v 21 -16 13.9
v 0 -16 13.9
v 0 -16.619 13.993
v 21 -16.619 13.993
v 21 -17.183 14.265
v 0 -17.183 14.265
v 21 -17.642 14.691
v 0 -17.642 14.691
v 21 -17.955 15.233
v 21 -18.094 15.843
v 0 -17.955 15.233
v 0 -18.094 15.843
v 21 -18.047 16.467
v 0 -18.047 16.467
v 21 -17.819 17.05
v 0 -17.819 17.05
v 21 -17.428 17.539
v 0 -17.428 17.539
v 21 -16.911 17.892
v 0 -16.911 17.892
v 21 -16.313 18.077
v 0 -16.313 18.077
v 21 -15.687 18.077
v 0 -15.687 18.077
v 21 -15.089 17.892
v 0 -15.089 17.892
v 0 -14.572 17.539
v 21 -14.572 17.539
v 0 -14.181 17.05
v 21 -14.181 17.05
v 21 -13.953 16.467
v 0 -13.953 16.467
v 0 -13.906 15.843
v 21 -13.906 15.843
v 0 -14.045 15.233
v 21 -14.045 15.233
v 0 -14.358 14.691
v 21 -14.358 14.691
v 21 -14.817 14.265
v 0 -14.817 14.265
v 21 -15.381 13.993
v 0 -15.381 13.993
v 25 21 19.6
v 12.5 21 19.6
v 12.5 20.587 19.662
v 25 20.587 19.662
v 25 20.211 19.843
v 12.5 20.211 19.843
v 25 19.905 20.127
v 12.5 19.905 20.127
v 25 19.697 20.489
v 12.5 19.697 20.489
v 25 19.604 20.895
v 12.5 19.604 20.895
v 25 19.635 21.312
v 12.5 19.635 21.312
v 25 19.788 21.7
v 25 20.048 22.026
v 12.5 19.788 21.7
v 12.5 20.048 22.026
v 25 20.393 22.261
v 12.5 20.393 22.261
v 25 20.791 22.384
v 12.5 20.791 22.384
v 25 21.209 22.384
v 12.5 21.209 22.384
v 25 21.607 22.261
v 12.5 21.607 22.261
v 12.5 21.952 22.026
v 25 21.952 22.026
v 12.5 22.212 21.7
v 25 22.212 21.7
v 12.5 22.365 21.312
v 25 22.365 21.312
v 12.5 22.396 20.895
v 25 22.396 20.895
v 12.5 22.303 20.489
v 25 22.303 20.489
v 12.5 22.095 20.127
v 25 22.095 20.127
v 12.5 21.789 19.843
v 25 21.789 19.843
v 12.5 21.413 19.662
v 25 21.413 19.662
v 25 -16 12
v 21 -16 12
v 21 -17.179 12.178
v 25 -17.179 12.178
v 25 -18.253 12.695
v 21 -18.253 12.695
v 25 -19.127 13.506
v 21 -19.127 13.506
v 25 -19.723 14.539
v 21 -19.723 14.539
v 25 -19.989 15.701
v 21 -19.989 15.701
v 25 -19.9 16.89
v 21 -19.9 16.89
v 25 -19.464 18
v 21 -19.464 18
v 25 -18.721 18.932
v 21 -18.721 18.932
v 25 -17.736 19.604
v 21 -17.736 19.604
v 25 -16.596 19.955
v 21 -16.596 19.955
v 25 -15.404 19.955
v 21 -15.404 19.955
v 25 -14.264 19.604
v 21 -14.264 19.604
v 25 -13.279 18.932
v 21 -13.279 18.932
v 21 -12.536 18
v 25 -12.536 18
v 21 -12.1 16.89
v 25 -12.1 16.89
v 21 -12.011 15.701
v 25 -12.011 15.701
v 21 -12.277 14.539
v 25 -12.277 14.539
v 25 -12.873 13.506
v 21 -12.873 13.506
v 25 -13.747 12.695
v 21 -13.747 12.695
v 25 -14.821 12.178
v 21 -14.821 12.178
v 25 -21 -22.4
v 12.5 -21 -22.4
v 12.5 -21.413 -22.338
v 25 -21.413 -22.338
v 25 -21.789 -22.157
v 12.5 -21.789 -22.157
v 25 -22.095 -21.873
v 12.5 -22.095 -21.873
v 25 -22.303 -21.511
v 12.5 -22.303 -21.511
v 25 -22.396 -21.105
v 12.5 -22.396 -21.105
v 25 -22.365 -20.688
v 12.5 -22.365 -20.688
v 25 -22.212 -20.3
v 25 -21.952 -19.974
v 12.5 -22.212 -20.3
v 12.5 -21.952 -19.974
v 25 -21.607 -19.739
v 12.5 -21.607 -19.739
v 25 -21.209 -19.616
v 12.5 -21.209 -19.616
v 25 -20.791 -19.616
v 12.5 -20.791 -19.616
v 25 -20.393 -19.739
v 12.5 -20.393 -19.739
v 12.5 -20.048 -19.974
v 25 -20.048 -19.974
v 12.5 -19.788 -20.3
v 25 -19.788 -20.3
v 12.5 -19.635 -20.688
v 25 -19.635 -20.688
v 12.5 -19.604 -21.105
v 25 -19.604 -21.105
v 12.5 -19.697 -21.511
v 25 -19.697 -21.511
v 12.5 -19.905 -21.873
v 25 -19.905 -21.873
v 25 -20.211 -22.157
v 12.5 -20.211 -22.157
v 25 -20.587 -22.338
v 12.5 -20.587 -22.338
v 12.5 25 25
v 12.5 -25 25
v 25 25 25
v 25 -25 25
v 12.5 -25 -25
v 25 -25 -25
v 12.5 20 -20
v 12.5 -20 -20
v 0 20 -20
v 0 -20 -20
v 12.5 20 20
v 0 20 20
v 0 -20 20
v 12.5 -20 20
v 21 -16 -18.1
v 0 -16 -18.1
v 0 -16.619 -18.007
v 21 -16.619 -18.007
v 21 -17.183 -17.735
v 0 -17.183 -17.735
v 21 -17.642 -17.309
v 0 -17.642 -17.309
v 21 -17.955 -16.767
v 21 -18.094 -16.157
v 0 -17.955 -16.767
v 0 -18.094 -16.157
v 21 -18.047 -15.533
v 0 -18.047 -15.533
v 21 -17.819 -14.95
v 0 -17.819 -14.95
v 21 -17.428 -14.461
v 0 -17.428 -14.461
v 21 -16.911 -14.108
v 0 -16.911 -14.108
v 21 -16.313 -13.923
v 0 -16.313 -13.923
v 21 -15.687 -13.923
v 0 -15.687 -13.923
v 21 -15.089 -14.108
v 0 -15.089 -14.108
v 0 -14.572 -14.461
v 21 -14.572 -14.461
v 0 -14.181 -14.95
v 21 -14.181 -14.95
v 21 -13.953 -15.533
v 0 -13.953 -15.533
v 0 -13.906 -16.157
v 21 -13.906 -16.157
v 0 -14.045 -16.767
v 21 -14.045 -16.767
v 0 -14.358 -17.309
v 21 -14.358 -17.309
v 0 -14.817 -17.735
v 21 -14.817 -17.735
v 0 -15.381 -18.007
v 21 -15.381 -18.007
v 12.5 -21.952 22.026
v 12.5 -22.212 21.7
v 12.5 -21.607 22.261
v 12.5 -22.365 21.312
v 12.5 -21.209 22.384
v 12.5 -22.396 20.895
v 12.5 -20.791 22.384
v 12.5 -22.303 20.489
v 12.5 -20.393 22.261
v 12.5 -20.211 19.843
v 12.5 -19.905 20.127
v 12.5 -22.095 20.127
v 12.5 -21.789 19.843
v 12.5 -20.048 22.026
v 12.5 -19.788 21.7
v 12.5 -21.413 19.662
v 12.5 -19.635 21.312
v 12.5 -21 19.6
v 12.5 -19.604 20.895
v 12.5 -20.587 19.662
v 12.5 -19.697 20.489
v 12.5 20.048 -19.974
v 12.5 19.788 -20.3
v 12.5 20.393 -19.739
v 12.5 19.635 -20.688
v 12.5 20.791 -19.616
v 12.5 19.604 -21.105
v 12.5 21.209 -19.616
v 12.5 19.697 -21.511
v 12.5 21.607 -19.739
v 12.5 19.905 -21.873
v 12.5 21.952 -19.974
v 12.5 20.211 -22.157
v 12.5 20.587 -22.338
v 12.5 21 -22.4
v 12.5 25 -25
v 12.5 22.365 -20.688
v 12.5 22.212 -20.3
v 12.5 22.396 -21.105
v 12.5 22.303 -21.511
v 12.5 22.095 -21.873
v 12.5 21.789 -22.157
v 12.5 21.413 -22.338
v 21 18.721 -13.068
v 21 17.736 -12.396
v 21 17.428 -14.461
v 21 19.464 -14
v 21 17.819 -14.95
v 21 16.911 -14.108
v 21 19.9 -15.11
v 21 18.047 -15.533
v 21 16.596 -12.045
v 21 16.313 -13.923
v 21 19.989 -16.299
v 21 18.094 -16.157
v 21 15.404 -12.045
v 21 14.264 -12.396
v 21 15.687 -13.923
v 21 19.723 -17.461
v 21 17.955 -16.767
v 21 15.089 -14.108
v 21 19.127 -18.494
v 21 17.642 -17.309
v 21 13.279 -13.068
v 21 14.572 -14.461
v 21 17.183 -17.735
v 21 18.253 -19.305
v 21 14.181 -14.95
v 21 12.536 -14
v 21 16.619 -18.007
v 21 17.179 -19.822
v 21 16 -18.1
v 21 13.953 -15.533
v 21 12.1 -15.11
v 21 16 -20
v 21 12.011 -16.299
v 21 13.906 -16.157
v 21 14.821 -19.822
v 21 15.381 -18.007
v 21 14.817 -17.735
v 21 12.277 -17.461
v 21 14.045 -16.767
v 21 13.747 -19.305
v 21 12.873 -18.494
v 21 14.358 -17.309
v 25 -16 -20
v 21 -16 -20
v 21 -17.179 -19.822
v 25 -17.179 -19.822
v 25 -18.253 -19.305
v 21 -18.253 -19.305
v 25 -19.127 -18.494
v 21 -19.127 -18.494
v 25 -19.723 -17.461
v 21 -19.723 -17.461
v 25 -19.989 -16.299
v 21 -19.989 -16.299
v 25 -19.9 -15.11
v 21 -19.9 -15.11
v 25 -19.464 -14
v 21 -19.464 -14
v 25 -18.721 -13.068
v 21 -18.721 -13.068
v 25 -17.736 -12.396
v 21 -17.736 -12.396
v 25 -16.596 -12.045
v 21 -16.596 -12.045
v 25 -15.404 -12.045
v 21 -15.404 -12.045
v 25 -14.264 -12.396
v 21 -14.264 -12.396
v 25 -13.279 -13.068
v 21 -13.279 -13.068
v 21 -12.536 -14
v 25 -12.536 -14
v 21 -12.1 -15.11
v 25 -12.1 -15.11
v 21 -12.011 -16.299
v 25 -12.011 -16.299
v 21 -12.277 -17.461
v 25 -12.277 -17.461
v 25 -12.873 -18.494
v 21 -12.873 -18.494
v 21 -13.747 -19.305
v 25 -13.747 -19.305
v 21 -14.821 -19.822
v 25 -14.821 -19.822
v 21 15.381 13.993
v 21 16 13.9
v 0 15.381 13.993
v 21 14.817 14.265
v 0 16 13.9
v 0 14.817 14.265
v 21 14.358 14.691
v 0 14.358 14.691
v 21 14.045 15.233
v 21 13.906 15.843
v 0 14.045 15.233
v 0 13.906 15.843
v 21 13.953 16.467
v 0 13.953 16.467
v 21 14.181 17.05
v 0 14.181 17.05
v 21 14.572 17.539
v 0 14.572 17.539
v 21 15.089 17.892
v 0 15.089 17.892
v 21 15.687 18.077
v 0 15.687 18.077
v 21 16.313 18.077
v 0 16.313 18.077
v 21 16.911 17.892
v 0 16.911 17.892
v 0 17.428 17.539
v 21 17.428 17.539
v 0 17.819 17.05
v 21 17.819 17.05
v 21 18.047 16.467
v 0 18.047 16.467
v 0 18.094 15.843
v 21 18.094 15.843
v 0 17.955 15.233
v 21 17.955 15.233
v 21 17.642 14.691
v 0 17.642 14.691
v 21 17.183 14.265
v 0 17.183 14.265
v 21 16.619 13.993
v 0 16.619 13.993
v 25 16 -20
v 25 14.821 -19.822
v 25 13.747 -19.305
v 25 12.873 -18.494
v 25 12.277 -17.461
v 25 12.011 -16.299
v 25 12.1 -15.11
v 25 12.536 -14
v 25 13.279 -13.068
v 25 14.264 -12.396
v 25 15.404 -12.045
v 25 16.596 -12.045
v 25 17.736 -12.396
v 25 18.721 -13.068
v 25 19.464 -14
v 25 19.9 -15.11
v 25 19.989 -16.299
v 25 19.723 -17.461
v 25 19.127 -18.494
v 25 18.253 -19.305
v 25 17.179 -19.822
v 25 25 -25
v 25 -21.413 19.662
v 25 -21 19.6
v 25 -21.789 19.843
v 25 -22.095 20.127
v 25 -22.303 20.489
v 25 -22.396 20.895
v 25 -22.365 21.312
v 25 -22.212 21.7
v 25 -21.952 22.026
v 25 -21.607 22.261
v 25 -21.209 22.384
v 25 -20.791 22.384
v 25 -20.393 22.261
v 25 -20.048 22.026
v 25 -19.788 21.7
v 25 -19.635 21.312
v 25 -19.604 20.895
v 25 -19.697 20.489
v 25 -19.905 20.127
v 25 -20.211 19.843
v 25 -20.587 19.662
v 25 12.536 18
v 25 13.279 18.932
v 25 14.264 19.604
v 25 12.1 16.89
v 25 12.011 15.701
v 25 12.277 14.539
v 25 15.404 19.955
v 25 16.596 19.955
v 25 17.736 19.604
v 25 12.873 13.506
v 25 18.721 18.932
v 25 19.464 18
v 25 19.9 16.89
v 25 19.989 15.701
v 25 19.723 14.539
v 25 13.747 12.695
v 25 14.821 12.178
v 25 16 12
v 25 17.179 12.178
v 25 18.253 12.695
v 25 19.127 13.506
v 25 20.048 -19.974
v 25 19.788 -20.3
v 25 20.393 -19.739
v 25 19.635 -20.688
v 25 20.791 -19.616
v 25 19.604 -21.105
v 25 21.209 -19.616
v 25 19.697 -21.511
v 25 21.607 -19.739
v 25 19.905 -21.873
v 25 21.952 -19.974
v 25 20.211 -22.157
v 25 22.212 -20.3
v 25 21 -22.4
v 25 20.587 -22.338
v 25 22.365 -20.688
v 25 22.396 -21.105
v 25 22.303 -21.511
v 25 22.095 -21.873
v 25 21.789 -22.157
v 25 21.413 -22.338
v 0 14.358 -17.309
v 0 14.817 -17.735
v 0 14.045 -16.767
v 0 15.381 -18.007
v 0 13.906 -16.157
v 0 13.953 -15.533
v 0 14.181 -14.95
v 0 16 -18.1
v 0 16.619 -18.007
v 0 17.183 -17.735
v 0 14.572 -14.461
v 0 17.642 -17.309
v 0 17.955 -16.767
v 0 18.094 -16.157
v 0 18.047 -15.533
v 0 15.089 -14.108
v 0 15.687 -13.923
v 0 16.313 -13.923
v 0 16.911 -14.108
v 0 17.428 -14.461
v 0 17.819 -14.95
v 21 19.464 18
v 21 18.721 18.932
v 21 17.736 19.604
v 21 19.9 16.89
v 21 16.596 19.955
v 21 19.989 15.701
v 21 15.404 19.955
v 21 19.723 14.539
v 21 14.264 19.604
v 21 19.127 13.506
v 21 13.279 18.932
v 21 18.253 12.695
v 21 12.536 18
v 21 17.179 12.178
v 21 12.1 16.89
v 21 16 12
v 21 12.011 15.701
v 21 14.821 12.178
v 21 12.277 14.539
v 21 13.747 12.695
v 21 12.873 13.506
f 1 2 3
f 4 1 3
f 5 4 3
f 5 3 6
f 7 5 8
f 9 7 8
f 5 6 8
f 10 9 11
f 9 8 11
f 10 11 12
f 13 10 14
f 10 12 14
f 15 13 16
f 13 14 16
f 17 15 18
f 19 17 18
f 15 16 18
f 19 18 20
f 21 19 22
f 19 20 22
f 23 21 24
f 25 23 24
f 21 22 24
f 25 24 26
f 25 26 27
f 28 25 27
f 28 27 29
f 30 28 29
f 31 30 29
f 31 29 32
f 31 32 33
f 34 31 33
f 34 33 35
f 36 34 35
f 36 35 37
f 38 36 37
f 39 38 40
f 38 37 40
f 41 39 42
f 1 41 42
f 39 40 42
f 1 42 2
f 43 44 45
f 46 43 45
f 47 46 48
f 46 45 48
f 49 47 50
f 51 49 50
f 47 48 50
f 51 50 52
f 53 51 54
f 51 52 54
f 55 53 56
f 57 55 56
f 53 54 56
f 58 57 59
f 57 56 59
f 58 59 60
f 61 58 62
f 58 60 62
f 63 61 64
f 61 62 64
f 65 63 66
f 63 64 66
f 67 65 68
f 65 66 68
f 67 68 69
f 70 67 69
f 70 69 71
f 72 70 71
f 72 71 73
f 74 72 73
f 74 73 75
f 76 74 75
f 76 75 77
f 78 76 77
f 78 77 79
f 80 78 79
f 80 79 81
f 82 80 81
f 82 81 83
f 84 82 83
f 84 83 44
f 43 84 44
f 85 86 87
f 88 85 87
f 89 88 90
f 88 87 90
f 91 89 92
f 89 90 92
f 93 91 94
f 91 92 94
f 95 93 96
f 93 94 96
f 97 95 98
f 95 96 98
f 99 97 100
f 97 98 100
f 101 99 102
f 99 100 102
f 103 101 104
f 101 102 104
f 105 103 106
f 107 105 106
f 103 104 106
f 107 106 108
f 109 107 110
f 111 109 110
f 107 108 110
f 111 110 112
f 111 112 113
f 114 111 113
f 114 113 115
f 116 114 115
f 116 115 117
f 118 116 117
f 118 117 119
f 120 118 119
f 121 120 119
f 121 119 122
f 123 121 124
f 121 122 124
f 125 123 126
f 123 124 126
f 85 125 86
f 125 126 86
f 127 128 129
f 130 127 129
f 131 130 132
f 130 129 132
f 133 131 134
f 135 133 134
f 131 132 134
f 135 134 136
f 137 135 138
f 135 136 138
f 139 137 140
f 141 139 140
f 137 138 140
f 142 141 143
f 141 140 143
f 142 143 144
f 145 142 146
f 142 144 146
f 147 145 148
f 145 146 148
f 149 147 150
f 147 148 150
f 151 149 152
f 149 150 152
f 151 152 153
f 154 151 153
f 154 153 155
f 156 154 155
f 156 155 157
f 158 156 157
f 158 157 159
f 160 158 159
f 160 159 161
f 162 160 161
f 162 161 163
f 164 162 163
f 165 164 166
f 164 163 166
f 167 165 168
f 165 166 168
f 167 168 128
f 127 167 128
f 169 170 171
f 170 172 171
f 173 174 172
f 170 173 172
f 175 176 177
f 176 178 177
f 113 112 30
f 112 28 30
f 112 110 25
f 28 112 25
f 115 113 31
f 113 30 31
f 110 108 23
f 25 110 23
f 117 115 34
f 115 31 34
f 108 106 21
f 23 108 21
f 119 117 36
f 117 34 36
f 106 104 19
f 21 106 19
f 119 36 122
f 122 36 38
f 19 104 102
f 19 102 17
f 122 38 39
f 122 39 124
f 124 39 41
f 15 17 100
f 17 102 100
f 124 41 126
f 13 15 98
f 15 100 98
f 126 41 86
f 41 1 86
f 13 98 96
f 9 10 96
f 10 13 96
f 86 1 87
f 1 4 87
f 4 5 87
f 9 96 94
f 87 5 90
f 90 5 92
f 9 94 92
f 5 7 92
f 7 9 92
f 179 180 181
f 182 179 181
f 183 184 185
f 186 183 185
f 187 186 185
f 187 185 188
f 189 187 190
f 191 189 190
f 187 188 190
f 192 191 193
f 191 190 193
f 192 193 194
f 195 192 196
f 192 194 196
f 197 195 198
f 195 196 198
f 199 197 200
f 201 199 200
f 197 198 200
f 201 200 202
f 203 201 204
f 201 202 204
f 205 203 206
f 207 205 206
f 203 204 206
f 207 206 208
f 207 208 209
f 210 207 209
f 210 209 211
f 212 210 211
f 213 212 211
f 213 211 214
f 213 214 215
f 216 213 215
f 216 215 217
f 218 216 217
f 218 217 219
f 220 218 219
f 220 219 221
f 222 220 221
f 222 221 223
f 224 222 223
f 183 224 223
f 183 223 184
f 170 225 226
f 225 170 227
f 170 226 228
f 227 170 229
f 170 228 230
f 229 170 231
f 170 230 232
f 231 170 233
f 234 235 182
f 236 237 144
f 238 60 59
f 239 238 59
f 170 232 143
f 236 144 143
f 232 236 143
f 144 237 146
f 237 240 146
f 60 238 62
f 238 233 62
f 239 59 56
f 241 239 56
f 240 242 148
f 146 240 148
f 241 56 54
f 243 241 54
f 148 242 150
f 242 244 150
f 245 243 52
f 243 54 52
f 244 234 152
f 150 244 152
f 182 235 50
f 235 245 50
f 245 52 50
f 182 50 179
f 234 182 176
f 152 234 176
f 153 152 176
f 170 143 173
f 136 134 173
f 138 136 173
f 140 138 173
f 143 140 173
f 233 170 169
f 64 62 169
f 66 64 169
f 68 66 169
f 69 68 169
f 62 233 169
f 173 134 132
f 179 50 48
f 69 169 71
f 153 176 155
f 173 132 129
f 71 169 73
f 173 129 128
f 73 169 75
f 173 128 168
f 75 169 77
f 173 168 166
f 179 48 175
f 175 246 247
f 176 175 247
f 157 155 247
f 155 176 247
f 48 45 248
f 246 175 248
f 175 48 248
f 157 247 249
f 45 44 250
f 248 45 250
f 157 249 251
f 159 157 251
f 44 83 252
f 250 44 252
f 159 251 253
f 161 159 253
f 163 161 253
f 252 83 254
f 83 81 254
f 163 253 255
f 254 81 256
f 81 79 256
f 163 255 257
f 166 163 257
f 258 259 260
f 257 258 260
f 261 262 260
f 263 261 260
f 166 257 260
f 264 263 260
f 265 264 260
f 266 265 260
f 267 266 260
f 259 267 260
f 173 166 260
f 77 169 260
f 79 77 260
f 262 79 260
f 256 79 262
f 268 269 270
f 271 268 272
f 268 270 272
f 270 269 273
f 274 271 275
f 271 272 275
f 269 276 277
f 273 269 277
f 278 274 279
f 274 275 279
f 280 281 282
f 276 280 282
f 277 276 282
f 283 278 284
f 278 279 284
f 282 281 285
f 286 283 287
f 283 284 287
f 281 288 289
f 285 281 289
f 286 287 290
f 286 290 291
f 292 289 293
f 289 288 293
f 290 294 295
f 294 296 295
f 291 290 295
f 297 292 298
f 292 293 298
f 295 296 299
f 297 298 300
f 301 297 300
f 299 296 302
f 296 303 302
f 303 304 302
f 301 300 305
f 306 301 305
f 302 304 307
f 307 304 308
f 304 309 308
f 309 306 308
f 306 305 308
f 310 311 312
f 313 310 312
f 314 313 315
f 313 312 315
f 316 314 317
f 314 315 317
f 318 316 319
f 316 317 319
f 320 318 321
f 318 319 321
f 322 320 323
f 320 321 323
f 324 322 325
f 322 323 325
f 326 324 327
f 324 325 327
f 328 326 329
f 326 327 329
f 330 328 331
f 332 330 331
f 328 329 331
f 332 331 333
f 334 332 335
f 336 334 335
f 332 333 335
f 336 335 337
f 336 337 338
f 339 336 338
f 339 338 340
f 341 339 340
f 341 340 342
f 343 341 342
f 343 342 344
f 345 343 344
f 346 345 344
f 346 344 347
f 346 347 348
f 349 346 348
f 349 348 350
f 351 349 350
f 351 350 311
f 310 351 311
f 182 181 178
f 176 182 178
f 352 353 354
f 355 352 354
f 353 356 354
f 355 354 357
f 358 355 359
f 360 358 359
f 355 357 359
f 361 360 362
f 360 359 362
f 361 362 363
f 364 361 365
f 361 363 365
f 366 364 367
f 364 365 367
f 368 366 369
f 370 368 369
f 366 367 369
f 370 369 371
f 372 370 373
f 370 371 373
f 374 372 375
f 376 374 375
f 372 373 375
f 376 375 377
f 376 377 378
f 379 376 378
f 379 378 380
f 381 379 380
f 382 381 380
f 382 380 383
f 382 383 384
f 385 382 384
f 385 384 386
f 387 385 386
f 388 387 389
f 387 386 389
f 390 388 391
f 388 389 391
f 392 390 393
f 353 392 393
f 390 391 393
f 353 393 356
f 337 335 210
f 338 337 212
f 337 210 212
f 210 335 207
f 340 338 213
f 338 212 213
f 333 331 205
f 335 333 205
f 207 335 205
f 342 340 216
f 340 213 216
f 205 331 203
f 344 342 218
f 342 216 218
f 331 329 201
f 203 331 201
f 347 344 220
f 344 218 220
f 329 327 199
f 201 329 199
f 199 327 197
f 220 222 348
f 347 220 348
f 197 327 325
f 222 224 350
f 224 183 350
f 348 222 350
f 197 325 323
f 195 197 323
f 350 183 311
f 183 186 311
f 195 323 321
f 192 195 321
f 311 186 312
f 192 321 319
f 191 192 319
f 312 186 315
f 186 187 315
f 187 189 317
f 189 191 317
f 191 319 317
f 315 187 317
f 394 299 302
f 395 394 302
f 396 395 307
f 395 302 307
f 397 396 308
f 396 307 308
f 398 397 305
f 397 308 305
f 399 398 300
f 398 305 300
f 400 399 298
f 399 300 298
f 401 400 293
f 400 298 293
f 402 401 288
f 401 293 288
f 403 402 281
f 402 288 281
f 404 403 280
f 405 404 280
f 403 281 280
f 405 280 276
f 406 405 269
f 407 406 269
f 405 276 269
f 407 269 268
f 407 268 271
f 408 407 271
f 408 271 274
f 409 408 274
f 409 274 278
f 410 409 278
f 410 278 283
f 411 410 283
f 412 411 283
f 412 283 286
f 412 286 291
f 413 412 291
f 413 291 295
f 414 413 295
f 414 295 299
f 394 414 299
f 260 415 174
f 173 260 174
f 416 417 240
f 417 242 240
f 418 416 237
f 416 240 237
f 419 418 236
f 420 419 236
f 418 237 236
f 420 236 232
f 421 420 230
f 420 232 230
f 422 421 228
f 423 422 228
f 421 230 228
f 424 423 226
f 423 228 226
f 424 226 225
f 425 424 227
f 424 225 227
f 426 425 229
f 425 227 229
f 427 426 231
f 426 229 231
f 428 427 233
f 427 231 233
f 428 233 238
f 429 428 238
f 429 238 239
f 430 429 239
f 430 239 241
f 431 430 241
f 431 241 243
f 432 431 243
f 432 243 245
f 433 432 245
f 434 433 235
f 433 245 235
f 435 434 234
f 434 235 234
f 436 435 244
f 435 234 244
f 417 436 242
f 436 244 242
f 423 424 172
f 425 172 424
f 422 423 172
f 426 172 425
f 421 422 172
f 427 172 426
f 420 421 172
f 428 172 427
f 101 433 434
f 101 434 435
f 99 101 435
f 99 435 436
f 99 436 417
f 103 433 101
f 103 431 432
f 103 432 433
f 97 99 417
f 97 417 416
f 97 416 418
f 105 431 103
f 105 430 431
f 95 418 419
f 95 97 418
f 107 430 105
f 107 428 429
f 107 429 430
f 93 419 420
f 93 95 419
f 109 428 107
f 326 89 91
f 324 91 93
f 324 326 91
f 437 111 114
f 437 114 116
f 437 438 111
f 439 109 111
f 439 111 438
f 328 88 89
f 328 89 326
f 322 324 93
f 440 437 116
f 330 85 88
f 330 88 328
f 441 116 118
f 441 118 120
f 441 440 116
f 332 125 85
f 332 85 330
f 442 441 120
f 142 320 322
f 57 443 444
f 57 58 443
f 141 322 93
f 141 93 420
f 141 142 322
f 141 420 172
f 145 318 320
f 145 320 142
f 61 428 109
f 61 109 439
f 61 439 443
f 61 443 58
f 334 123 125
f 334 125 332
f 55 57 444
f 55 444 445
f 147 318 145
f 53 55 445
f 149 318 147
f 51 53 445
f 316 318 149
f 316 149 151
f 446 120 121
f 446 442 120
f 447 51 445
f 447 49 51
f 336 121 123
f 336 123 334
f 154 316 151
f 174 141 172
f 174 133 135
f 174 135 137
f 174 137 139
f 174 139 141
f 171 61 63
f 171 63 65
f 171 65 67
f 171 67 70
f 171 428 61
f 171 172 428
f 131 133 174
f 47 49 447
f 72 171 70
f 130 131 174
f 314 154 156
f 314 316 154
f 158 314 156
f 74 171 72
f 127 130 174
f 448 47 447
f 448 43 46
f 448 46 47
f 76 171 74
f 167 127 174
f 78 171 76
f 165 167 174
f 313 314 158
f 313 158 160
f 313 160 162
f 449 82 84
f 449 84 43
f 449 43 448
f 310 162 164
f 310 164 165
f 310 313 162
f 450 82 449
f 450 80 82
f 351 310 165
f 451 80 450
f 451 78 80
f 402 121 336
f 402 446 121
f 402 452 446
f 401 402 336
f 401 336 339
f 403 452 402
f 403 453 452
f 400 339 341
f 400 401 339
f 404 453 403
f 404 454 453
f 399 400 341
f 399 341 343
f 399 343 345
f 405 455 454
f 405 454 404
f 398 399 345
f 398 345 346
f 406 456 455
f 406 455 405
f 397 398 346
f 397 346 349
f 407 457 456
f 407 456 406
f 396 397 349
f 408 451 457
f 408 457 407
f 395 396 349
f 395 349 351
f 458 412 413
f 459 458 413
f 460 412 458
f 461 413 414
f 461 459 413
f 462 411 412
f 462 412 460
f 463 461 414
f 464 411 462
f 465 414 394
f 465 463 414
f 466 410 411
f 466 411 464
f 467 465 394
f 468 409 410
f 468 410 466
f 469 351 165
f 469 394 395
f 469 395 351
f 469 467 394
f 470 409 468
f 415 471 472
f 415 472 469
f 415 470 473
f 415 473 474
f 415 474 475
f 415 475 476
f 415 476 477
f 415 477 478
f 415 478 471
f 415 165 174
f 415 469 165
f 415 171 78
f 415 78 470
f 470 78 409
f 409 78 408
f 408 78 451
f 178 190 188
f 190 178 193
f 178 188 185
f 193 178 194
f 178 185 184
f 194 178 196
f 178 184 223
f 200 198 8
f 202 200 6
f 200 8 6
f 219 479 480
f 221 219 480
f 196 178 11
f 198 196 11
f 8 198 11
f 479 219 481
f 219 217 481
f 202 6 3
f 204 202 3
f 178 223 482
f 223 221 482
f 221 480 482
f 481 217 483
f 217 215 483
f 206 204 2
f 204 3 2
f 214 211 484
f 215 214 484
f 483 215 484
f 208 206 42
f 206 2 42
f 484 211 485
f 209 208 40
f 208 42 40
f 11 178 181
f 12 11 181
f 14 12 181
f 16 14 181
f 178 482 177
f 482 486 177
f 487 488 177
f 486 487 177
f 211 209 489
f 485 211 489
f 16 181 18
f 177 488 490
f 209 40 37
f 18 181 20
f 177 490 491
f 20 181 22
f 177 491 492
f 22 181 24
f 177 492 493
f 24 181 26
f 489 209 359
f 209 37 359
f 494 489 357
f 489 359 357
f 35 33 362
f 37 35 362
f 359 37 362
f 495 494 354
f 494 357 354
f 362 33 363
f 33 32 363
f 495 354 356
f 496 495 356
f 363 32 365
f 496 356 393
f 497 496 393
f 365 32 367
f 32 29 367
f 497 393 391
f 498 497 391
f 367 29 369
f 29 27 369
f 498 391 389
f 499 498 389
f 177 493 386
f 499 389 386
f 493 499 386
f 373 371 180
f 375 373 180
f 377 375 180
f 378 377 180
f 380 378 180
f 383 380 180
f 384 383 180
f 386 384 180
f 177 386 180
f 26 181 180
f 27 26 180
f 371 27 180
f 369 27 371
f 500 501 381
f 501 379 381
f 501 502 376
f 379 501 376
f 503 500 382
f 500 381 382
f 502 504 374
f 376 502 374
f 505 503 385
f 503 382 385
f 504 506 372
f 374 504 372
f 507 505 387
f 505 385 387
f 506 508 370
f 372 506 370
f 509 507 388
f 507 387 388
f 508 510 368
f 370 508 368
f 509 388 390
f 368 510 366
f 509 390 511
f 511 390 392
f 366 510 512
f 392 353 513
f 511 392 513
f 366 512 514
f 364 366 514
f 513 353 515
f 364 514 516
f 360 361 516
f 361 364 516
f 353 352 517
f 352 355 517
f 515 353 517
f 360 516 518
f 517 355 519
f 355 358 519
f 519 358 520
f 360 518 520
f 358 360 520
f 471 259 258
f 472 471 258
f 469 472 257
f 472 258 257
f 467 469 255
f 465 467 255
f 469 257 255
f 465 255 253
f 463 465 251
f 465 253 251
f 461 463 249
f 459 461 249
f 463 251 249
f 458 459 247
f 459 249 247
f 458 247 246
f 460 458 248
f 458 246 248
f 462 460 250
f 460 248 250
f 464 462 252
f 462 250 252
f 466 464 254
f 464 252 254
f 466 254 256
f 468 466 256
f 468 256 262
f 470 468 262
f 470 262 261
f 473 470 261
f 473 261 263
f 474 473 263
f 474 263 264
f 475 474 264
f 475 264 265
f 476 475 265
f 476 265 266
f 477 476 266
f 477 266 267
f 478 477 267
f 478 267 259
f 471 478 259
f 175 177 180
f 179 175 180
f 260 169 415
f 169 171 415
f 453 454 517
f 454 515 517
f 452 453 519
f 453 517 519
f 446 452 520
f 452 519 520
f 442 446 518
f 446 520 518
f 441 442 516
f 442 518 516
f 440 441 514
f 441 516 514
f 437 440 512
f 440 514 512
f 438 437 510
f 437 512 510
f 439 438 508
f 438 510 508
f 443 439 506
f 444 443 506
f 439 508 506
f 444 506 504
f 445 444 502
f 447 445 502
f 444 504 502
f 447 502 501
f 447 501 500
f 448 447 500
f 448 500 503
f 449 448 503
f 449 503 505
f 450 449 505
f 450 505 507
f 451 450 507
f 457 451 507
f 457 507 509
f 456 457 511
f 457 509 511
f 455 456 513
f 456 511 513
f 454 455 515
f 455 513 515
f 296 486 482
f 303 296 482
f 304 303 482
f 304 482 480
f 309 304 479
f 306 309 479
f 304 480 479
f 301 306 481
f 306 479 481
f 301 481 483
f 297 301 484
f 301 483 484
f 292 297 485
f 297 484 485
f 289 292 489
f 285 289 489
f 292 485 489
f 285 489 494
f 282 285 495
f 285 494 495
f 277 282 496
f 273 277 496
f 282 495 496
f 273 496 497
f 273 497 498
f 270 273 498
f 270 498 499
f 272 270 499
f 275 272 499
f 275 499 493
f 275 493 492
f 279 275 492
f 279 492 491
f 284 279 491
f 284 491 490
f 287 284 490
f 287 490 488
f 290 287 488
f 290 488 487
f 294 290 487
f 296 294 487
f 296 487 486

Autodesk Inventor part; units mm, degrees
ref_plane "YZ Plane" through (0, 0, 0) normal (1, 0, 0) x (0, 1, 0)
ref_plane "XZ Plane" through (0, 0, 0) normal (0, 1, 0) x (-1, 0, 0)
ref_plane "XY Plane" through (0, 0, 0) normal (0, 0, 1) x (1, 0, 0)
sketch "Skizze1" plane through (0, 0, 0) normal (1, 0, 0) x (0, 1, 0)
  line L0 (20, 20) -> (-20, 20)
  line L1 (-20, 20) -> (-20, -20)
  line L2 (-20, -20) -> (20, -20)
  line L3 (20, -20) -> (20, 20)
  line L4 (20, 20) -> (-20, -20) construction
  line L5 (-20, 20) -> (20, -20) construction
  point P0 (0, 0)
  dimension "d0" = 40
  dimension "d1" = 40
extrude "Extrusion1" add sketch "Skizze1" along normal blind 25
sketch "Skizze2" plane through (25, 0, 0) normal (1, 0, 0) x (0, 0, -1)
  line L0 (-25, 25) -> (25, 25)
  line L1 (25, 25) -> (25, -25)
  line L2 (25, -25) -> (-25, -25)
  line L3 (-25, -25) -> (-25, 25)
  line L4 (-25, 25) -> (25, -25) construction
  line L5 (25, 25) -> (-25, -25) construction
  point P0 (0, 0)
  dimension "d4" = 50
  dimension "d5" = 50
extrude "Extrusion2" add sketch "Skizze2" against normal blind 12.5
sketch "Skizze3" plane through (25, 0, 0) normal (1, 0, 0) x (0, 0, -1)
  point P0 (0, 0)
  point P1 (21, -21)
  point P2 (-21, -21)
  point P3 (-21, 21)
  point P4 (21, 21)
  point P5 (16, -16)
  point P6 (-16, -16)
  point P7 (-16, 16)
  point P8 (16, 16)
hole "Bohrung1" at (25, -21, -21) at (25, -21, 21) at (25, 21, 21) at (25, 21, -21) at (25, -16, -16) at (25, -16, 16) at (25, 16, 16) at (25, 16, -16) direction (-1, 0, 0) diameter 2.8 depth 230
sketch "Skizze4" plane through (25, 0, 0) normal (1, 0, 0) x (0, 0, -1)
  circle A0 centre (-16, 16) radius 1.4 projected
  circle A1 centre (16, -16) radius 1.4 projected
  circle A2 centre (-21, 21) radius 1.4 projected
  circle A3 centre (21, -21) radius 1.4 projected
  circle A4 centre (-21, -21) radius 1.4 projected
  circle A5 centre (21, 21) radius 1.4 projected
  circle A6 centre (-16, -16) radius 1.4 projected
  circle A7 centre (16, 16) radius 1.4 projected
  line L0 (-25, -25) -> (25, -25) projected
  line L1 (25, -25) -> (25, 25) projected
  line L2 (25, 25) -> (-25, 25) projected
  line L3 (-25, 25) -> (-25, -25) projected
  circle A8 centre (-16, 16) radius 1.4 projected
  circle A9 centre (16, 16) radius 1.4 projected
  circle A10 centre (16, -16) radius 1.4 projected
  point P0 (0, 0)
hole "Bohrung2" at (25, 16, 16) at (25, 16, -16) at (25, -16, -16) at (25, -16, 16) direction (-1, 0, 0) diameter 4.2 depth 230 counterbore diameter 8 counterbore depth 4
properties part number "OCT_SpiegelAdapter_MovingSt."
